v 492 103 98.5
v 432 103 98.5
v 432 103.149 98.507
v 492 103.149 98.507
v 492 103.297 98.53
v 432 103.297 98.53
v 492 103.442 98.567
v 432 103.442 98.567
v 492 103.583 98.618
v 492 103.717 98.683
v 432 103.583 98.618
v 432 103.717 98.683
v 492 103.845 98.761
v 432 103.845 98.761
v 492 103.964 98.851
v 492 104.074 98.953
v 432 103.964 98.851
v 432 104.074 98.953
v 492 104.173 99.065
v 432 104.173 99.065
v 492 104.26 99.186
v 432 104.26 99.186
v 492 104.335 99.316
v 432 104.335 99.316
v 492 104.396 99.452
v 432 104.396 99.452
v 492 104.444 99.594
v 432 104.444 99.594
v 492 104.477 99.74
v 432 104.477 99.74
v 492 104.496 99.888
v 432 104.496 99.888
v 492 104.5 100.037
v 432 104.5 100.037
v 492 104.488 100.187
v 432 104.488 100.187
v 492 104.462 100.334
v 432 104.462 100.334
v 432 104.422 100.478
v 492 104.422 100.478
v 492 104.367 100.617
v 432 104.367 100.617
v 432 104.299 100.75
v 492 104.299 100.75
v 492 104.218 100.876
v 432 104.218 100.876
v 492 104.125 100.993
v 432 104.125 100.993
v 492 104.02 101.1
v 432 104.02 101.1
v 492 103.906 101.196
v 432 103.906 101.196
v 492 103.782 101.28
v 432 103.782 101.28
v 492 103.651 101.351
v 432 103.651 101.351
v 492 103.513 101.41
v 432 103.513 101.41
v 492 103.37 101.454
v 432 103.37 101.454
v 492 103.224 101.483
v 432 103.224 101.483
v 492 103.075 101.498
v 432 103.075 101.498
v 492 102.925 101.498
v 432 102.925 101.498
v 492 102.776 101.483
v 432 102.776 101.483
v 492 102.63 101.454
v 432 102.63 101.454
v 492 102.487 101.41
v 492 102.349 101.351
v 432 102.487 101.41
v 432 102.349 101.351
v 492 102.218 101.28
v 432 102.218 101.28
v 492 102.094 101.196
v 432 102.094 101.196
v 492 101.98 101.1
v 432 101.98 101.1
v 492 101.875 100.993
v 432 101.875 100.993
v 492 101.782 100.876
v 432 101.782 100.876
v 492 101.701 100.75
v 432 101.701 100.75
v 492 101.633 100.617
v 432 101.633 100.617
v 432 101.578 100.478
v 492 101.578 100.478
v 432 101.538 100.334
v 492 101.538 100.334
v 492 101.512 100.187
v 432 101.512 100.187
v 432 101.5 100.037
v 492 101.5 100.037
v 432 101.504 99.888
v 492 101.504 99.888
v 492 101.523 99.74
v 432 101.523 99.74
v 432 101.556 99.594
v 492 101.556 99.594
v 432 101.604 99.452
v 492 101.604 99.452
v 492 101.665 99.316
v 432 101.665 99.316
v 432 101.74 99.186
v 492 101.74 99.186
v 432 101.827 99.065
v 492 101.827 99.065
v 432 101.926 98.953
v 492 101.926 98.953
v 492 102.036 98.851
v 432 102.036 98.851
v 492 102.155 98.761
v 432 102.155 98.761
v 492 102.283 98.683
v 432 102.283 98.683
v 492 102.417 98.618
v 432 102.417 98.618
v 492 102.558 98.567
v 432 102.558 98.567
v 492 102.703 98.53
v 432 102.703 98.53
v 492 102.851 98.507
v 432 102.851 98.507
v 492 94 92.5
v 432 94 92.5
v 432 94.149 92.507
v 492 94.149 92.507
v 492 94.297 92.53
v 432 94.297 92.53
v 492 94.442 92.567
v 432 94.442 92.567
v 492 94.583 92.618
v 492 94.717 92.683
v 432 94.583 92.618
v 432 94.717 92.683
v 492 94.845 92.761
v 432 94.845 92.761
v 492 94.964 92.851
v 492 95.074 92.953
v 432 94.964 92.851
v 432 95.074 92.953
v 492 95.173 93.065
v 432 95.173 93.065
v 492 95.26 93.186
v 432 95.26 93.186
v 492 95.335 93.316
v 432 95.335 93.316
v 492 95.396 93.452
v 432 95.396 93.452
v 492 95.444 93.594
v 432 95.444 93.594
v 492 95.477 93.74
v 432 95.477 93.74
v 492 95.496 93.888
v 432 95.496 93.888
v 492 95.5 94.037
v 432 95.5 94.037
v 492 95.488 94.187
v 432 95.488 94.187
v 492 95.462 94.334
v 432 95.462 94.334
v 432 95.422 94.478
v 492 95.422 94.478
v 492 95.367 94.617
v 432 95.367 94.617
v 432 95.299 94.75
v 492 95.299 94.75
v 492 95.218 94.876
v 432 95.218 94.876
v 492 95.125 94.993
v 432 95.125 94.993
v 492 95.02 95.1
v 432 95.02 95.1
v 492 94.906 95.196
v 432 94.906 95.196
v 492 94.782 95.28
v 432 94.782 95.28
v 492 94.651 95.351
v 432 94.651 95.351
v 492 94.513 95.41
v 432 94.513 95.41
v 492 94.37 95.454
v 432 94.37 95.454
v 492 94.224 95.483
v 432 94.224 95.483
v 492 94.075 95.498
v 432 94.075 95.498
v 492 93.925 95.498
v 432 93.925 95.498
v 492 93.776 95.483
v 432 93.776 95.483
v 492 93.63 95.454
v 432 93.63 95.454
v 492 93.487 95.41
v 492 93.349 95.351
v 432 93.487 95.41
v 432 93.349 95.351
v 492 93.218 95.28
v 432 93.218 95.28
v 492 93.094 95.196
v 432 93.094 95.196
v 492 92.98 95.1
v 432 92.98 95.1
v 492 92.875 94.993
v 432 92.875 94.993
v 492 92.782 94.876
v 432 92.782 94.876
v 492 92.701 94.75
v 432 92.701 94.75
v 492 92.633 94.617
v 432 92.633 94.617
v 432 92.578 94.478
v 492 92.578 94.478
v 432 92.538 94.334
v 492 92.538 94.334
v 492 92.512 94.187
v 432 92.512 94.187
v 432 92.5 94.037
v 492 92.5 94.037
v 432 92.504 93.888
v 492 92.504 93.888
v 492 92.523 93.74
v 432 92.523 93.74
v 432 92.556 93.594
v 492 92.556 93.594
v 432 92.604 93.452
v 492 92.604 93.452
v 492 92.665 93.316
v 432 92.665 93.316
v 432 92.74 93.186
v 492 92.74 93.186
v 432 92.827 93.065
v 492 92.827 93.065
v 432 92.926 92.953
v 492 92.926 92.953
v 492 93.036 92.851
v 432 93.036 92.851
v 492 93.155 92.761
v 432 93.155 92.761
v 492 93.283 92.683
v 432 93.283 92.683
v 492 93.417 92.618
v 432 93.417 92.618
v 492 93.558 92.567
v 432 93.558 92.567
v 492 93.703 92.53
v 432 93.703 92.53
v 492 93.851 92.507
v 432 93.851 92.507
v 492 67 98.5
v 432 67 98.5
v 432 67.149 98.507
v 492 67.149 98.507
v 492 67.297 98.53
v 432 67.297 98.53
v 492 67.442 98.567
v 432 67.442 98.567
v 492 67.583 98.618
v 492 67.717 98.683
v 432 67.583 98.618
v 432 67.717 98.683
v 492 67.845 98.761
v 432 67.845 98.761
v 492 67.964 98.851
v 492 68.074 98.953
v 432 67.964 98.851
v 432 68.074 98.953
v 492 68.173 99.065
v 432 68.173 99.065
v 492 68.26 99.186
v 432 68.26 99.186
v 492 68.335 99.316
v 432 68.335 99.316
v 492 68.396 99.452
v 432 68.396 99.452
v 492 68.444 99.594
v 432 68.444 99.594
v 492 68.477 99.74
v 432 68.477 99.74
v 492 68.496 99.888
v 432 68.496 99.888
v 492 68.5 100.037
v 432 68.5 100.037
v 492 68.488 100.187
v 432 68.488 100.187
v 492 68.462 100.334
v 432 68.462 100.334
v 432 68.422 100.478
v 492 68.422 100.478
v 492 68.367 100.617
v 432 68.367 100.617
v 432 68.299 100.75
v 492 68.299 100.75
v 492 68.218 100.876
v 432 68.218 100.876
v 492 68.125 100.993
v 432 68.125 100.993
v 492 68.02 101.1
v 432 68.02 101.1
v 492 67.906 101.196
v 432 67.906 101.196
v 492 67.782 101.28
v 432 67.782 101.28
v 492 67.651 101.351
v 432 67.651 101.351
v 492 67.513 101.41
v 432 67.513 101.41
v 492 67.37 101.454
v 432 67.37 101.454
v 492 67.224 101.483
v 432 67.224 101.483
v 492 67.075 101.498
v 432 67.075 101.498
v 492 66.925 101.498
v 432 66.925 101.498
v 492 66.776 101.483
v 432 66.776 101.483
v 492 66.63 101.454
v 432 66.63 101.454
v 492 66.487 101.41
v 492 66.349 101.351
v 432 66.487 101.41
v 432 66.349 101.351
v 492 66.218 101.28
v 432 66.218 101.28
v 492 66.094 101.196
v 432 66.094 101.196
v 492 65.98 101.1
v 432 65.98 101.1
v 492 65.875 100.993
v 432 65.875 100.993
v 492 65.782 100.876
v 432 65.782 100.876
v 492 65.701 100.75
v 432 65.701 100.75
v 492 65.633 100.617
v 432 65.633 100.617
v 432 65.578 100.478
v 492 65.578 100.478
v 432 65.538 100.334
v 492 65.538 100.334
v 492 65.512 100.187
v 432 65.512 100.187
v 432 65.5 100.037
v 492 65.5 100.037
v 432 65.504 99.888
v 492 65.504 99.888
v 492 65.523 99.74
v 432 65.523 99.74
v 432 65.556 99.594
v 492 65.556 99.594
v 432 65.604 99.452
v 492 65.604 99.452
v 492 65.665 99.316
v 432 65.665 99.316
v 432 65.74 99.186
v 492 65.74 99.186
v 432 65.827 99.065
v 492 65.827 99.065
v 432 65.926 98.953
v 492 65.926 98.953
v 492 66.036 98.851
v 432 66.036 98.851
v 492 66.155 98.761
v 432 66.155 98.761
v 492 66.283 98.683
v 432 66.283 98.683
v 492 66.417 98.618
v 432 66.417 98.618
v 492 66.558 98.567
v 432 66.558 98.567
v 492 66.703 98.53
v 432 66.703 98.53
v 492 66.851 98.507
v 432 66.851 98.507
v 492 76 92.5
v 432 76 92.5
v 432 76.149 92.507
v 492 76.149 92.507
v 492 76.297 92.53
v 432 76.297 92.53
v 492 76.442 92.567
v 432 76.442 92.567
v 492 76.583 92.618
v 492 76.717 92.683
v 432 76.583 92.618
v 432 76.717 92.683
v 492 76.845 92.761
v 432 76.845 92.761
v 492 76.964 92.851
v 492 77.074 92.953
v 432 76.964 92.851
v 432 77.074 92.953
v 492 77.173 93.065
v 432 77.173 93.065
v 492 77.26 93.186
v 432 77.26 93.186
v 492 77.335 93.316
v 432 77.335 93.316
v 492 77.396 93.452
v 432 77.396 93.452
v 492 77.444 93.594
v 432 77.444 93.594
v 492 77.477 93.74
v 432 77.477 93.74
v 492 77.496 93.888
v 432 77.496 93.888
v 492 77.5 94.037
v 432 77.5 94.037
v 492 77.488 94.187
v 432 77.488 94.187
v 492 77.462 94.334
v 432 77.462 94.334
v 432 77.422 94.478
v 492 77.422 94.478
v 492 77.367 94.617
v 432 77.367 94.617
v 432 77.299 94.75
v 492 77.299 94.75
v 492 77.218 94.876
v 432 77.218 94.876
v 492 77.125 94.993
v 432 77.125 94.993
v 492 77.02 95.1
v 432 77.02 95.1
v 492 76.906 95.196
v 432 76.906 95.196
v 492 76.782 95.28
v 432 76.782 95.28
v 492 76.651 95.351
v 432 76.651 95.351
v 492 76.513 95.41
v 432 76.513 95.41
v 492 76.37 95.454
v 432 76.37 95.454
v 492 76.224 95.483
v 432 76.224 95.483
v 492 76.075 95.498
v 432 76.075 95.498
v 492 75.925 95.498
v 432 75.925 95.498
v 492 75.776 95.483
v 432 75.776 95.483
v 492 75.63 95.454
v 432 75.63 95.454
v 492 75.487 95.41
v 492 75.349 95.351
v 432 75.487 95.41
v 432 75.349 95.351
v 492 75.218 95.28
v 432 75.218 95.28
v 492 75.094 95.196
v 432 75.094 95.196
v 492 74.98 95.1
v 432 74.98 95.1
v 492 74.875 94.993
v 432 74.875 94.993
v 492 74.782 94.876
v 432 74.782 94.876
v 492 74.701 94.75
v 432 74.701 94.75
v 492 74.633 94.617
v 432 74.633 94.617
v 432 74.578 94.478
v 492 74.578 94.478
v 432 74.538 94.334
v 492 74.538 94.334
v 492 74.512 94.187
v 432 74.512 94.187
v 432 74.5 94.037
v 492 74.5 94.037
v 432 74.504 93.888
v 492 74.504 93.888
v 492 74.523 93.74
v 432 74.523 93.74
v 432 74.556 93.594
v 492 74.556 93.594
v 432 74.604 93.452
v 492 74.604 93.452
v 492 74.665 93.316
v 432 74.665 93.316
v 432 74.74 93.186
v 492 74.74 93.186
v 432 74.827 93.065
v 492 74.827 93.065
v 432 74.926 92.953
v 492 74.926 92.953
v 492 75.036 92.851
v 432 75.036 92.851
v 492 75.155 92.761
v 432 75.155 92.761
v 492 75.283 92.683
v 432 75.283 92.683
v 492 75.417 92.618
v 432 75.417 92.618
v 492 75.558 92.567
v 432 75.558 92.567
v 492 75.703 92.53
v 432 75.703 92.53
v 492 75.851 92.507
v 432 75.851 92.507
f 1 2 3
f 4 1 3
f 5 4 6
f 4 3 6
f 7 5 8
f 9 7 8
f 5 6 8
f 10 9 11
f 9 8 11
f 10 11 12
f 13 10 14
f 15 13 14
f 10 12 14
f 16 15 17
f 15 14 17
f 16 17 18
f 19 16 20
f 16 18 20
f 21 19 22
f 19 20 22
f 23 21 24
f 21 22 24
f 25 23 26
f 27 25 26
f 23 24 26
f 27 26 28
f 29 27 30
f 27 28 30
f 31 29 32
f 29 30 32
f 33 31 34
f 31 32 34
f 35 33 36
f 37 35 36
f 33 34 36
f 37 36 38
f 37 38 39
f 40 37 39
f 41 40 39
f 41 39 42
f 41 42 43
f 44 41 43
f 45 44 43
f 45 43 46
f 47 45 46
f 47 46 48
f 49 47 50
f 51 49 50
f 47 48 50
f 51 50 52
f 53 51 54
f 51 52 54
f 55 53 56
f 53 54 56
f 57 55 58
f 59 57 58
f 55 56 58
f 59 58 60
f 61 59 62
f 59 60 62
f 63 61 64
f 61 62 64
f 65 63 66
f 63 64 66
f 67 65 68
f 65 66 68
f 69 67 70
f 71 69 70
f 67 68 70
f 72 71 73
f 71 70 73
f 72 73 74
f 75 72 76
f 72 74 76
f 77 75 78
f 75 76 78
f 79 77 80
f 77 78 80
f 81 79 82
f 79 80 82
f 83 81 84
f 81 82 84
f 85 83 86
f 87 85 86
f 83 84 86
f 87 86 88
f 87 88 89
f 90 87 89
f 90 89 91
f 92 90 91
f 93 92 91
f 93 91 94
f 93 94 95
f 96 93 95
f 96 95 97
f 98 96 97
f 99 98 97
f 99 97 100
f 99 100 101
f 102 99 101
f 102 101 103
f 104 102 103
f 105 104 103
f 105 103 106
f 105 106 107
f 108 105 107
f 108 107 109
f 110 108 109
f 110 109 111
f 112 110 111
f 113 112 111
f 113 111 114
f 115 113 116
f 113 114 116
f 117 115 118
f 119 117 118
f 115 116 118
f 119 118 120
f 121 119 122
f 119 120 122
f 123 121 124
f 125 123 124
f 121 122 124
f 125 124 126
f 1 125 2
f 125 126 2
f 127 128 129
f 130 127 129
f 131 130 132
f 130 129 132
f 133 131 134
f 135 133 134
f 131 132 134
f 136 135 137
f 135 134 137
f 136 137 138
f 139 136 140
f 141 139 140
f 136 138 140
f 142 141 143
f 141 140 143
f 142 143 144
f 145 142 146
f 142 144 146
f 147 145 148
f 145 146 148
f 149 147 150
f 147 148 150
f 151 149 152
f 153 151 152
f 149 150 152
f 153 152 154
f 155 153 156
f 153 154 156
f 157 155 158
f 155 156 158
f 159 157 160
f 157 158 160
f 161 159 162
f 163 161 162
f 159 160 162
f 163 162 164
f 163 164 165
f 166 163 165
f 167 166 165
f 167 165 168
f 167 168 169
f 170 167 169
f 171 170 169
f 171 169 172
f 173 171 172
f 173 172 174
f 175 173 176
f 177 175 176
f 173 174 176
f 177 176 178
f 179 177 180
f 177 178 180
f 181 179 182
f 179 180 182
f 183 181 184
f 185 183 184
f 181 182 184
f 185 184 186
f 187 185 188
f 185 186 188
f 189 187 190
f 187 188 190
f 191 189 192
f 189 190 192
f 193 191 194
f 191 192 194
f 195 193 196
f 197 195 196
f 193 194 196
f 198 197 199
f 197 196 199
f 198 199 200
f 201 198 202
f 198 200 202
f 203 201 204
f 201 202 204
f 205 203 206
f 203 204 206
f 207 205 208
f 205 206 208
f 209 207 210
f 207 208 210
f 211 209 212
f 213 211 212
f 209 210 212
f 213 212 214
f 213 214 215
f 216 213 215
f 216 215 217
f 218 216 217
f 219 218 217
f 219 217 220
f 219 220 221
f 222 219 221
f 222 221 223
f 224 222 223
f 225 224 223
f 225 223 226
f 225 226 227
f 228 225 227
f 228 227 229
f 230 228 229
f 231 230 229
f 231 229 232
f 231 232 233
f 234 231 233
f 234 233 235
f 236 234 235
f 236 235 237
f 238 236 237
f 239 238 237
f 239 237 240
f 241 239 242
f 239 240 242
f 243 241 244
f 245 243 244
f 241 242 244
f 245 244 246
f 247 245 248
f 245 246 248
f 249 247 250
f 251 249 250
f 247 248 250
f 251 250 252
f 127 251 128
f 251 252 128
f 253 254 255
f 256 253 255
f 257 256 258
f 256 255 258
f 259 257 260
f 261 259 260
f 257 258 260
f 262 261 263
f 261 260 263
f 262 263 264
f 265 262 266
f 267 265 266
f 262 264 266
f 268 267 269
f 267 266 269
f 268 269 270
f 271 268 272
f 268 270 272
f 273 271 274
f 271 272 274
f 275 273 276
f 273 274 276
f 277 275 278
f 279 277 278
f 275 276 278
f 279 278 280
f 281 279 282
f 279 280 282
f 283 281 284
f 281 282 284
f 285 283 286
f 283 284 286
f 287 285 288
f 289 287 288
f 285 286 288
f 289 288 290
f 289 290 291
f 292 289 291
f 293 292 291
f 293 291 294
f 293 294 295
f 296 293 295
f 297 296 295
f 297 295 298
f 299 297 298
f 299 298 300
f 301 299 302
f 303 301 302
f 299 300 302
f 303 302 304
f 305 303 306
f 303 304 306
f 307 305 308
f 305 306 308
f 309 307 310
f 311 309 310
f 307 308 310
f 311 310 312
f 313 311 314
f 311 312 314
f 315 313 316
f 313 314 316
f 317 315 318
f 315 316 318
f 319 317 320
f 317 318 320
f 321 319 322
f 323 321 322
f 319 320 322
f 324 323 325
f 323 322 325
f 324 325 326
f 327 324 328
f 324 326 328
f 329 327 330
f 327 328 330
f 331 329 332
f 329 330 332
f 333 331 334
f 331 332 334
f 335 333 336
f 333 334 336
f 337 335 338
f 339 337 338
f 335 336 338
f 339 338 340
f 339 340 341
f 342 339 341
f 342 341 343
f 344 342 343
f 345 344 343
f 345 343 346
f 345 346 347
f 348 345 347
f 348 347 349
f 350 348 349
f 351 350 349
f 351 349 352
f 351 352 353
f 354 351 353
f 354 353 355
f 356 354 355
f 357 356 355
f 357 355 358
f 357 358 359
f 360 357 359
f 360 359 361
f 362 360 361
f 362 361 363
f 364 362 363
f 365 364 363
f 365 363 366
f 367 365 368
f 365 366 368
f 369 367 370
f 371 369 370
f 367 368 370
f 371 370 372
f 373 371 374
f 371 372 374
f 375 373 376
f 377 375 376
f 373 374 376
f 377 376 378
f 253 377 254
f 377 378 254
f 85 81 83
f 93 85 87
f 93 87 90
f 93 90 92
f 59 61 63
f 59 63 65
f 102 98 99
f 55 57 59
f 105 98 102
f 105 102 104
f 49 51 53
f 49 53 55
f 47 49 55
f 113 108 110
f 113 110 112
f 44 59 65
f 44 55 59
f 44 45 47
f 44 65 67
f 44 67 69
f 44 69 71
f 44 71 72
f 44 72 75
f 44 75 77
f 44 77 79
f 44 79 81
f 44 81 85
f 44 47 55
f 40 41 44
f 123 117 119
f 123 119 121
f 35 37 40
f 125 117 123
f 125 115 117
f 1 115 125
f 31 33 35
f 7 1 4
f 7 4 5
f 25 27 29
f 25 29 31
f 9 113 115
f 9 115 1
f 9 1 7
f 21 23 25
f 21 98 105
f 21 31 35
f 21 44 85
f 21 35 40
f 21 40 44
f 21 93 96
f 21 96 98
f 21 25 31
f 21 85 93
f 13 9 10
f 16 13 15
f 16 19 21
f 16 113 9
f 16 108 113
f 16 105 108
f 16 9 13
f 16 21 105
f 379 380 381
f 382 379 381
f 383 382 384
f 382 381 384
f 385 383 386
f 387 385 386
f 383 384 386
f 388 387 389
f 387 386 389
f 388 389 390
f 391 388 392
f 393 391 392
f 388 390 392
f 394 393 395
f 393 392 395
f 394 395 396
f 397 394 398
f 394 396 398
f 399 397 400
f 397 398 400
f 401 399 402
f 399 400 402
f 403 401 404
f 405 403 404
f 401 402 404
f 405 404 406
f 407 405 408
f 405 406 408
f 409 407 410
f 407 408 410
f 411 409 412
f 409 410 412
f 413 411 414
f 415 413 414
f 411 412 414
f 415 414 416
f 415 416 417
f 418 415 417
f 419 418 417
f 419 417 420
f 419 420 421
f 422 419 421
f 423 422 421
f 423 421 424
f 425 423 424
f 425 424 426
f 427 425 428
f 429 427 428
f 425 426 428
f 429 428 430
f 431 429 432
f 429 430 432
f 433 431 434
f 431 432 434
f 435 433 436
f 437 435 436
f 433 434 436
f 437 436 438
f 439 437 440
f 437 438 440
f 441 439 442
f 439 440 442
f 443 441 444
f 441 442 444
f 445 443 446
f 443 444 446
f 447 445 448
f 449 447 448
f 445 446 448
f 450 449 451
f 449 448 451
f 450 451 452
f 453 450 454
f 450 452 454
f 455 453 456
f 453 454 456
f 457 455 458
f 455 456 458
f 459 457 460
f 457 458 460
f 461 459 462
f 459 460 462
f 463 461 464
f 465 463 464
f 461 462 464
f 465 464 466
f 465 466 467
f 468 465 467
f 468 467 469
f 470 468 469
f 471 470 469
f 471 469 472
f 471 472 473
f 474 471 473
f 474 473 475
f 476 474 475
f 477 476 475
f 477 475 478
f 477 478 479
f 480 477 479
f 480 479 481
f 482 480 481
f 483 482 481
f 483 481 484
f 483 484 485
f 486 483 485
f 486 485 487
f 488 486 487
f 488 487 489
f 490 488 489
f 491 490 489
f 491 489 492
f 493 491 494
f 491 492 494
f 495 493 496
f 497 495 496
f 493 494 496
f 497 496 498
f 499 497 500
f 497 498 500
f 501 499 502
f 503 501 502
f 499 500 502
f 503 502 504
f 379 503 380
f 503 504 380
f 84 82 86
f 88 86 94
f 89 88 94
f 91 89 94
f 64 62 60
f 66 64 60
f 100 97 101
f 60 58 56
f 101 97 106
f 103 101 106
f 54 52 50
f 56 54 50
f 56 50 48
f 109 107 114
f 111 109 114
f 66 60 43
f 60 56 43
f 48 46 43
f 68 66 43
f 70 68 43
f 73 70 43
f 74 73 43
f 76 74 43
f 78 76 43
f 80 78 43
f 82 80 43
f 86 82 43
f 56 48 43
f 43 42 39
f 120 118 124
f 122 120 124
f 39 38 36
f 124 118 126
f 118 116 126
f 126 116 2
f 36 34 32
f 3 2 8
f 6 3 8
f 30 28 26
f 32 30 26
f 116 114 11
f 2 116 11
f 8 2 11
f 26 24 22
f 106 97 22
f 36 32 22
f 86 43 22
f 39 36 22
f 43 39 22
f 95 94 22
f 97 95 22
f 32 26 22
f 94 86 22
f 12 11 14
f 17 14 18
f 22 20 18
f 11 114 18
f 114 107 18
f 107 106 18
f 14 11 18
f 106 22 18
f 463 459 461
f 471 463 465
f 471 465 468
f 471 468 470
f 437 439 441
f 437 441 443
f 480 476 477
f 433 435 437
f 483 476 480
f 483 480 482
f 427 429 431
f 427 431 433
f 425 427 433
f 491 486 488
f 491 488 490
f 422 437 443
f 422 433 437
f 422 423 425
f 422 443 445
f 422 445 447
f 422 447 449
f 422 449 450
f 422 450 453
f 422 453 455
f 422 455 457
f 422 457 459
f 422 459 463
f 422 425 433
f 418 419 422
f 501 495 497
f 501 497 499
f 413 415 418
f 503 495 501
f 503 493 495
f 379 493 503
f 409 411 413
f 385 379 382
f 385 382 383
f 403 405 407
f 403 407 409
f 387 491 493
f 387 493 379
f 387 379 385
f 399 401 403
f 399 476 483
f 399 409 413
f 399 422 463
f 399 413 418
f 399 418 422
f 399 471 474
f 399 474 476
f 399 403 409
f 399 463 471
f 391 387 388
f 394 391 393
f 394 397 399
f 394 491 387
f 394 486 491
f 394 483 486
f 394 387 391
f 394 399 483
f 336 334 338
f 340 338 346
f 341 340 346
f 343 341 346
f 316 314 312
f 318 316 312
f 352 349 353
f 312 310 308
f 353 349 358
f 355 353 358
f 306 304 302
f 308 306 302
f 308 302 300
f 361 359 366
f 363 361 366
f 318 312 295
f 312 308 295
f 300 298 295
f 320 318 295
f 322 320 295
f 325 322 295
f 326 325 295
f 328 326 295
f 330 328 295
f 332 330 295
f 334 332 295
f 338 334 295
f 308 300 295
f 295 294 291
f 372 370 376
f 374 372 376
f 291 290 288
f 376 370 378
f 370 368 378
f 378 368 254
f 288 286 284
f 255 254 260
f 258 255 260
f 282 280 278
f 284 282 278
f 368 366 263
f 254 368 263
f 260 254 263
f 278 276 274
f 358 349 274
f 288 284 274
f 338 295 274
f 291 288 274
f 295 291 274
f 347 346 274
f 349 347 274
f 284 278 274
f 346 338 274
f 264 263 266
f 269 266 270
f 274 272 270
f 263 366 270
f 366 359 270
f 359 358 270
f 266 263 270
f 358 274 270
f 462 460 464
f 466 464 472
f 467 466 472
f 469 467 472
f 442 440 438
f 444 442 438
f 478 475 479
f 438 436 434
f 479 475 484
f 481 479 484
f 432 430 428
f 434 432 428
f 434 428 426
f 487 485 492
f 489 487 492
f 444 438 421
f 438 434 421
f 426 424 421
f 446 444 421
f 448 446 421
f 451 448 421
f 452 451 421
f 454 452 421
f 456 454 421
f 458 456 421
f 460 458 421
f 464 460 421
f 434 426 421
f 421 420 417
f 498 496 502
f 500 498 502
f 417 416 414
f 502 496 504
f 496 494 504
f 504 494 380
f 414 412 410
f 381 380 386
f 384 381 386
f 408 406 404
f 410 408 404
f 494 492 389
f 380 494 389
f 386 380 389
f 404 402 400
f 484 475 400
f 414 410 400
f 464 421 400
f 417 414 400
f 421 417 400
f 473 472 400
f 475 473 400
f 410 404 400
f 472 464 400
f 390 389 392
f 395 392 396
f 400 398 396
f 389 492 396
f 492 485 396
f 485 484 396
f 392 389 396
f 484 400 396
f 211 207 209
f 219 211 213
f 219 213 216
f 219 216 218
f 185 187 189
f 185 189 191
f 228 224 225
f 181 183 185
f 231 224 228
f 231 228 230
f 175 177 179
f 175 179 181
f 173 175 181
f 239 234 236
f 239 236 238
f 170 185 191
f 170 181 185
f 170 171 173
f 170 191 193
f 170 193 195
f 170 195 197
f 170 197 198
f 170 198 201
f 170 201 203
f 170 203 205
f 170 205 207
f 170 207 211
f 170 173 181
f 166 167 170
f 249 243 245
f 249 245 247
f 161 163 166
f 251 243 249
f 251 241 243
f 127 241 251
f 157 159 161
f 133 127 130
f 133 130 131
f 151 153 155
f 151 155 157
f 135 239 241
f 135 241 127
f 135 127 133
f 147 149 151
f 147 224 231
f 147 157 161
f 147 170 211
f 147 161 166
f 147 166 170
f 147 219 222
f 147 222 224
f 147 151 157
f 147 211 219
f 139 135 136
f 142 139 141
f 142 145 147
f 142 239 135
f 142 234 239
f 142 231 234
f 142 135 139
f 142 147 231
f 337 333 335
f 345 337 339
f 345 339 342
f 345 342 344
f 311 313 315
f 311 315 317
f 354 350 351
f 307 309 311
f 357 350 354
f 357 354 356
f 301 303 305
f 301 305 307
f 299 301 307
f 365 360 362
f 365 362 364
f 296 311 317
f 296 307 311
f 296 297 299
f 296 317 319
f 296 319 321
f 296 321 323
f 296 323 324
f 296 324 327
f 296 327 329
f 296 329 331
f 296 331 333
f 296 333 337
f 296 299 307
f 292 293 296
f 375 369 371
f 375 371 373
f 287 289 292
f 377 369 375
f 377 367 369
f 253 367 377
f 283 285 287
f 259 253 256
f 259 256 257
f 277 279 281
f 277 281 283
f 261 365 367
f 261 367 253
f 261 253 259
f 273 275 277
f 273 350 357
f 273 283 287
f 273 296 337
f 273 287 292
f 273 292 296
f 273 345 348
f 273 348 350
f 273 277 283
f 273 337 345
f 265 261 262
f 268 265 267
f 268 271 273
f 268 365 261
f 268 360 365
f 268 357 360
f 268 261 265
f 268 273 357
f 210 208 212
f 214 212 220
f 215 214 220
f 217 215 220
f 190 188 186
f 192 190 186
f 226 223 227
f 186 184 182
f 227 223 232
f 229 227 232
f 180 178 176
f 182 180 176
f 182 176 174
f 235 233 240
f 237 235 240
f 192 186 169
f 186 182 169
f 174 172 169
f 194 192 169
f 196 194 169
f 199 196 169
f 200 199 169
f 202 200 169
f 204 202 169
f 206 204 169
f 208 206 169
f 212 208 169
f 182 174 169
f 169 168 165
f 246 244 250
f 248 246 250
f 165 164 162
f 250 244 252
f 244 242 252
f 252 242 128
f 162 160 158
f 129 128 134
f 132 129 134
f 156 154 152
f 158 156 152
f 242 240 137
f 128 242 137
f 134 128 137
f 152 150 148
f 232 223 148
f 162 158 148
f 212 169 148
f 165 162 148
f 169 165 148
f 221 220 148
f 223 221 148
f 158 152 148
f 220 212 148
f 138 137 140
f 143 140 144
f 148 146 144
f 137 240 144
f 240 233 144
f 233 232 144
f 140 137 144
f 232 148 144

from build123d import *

# Parameters (mm, degrees)
CYLINDER005_R      = 1.5
CYLINDER005_DEPTH  = 60
CYLINDER1198_R     = 1.5
CYLINDER1198_DEPTH = 60
CYLINDER1259_R     = 1.5
CYLINDER1259_DEPTH = 60
CYLINDER004_R      = 1.5
CYLINDER004_DEPTH  = 60


with BuildPart() as cylinder005:
    # Cylinder005 → Cylinder005 (new body)
    with BuildSketch(Plane(origin=(432, 67, 100), x_dir=(0, 0, -1), z_dir=(1, 0, 0))):
        Circle(CYLINDER005_R)
    extrude(amount=CYLINDER005_DEPTH)


with BuildPart() as cylinder1198:
    # Cylinder1198 → Cylinder1198 (new body)
    with BuildSketch(Plane(origin=(432, 94, 94), x_dir=(0, 0, -1), z_dir=(1, 0, 0))):
        Circle(CYLINDER1198_R)
    extrude(amount=CYLINDER1198_DEPTH)


with BuildPart() as cylinder1259:
    # Cylinder1259 → Cylinder1259 (new body)
    with BuildSketch(Plane(origin=(432, 76, 94), x_dir=(0, 0, -1), z_dir=(1, 0, 0))):
        Circle(CYLINDER1259_R)
    extrude(amount=CYLINDER1259_DEPTH)


with BuildPart() as fusion248002050187:
    # Cylinder004 → Cylinder004 (new body)
    with BuildSketch(Plane(origin=(432, 103, 100), x_dir=(0, 0, -1), z_dir=(1, 0, 0))):
        Circle(CYLINDER004_R)
    extrude(amount=CYLINDER004_DEPTH)

    # Fusion248002050187: union Cylinder005, Cylinder1198, Cylinder1259
    add(cylinder005.part)
    add(cylinder1198.part)
    add(cylinder1259.part)


solid = fusion248002050187.part
